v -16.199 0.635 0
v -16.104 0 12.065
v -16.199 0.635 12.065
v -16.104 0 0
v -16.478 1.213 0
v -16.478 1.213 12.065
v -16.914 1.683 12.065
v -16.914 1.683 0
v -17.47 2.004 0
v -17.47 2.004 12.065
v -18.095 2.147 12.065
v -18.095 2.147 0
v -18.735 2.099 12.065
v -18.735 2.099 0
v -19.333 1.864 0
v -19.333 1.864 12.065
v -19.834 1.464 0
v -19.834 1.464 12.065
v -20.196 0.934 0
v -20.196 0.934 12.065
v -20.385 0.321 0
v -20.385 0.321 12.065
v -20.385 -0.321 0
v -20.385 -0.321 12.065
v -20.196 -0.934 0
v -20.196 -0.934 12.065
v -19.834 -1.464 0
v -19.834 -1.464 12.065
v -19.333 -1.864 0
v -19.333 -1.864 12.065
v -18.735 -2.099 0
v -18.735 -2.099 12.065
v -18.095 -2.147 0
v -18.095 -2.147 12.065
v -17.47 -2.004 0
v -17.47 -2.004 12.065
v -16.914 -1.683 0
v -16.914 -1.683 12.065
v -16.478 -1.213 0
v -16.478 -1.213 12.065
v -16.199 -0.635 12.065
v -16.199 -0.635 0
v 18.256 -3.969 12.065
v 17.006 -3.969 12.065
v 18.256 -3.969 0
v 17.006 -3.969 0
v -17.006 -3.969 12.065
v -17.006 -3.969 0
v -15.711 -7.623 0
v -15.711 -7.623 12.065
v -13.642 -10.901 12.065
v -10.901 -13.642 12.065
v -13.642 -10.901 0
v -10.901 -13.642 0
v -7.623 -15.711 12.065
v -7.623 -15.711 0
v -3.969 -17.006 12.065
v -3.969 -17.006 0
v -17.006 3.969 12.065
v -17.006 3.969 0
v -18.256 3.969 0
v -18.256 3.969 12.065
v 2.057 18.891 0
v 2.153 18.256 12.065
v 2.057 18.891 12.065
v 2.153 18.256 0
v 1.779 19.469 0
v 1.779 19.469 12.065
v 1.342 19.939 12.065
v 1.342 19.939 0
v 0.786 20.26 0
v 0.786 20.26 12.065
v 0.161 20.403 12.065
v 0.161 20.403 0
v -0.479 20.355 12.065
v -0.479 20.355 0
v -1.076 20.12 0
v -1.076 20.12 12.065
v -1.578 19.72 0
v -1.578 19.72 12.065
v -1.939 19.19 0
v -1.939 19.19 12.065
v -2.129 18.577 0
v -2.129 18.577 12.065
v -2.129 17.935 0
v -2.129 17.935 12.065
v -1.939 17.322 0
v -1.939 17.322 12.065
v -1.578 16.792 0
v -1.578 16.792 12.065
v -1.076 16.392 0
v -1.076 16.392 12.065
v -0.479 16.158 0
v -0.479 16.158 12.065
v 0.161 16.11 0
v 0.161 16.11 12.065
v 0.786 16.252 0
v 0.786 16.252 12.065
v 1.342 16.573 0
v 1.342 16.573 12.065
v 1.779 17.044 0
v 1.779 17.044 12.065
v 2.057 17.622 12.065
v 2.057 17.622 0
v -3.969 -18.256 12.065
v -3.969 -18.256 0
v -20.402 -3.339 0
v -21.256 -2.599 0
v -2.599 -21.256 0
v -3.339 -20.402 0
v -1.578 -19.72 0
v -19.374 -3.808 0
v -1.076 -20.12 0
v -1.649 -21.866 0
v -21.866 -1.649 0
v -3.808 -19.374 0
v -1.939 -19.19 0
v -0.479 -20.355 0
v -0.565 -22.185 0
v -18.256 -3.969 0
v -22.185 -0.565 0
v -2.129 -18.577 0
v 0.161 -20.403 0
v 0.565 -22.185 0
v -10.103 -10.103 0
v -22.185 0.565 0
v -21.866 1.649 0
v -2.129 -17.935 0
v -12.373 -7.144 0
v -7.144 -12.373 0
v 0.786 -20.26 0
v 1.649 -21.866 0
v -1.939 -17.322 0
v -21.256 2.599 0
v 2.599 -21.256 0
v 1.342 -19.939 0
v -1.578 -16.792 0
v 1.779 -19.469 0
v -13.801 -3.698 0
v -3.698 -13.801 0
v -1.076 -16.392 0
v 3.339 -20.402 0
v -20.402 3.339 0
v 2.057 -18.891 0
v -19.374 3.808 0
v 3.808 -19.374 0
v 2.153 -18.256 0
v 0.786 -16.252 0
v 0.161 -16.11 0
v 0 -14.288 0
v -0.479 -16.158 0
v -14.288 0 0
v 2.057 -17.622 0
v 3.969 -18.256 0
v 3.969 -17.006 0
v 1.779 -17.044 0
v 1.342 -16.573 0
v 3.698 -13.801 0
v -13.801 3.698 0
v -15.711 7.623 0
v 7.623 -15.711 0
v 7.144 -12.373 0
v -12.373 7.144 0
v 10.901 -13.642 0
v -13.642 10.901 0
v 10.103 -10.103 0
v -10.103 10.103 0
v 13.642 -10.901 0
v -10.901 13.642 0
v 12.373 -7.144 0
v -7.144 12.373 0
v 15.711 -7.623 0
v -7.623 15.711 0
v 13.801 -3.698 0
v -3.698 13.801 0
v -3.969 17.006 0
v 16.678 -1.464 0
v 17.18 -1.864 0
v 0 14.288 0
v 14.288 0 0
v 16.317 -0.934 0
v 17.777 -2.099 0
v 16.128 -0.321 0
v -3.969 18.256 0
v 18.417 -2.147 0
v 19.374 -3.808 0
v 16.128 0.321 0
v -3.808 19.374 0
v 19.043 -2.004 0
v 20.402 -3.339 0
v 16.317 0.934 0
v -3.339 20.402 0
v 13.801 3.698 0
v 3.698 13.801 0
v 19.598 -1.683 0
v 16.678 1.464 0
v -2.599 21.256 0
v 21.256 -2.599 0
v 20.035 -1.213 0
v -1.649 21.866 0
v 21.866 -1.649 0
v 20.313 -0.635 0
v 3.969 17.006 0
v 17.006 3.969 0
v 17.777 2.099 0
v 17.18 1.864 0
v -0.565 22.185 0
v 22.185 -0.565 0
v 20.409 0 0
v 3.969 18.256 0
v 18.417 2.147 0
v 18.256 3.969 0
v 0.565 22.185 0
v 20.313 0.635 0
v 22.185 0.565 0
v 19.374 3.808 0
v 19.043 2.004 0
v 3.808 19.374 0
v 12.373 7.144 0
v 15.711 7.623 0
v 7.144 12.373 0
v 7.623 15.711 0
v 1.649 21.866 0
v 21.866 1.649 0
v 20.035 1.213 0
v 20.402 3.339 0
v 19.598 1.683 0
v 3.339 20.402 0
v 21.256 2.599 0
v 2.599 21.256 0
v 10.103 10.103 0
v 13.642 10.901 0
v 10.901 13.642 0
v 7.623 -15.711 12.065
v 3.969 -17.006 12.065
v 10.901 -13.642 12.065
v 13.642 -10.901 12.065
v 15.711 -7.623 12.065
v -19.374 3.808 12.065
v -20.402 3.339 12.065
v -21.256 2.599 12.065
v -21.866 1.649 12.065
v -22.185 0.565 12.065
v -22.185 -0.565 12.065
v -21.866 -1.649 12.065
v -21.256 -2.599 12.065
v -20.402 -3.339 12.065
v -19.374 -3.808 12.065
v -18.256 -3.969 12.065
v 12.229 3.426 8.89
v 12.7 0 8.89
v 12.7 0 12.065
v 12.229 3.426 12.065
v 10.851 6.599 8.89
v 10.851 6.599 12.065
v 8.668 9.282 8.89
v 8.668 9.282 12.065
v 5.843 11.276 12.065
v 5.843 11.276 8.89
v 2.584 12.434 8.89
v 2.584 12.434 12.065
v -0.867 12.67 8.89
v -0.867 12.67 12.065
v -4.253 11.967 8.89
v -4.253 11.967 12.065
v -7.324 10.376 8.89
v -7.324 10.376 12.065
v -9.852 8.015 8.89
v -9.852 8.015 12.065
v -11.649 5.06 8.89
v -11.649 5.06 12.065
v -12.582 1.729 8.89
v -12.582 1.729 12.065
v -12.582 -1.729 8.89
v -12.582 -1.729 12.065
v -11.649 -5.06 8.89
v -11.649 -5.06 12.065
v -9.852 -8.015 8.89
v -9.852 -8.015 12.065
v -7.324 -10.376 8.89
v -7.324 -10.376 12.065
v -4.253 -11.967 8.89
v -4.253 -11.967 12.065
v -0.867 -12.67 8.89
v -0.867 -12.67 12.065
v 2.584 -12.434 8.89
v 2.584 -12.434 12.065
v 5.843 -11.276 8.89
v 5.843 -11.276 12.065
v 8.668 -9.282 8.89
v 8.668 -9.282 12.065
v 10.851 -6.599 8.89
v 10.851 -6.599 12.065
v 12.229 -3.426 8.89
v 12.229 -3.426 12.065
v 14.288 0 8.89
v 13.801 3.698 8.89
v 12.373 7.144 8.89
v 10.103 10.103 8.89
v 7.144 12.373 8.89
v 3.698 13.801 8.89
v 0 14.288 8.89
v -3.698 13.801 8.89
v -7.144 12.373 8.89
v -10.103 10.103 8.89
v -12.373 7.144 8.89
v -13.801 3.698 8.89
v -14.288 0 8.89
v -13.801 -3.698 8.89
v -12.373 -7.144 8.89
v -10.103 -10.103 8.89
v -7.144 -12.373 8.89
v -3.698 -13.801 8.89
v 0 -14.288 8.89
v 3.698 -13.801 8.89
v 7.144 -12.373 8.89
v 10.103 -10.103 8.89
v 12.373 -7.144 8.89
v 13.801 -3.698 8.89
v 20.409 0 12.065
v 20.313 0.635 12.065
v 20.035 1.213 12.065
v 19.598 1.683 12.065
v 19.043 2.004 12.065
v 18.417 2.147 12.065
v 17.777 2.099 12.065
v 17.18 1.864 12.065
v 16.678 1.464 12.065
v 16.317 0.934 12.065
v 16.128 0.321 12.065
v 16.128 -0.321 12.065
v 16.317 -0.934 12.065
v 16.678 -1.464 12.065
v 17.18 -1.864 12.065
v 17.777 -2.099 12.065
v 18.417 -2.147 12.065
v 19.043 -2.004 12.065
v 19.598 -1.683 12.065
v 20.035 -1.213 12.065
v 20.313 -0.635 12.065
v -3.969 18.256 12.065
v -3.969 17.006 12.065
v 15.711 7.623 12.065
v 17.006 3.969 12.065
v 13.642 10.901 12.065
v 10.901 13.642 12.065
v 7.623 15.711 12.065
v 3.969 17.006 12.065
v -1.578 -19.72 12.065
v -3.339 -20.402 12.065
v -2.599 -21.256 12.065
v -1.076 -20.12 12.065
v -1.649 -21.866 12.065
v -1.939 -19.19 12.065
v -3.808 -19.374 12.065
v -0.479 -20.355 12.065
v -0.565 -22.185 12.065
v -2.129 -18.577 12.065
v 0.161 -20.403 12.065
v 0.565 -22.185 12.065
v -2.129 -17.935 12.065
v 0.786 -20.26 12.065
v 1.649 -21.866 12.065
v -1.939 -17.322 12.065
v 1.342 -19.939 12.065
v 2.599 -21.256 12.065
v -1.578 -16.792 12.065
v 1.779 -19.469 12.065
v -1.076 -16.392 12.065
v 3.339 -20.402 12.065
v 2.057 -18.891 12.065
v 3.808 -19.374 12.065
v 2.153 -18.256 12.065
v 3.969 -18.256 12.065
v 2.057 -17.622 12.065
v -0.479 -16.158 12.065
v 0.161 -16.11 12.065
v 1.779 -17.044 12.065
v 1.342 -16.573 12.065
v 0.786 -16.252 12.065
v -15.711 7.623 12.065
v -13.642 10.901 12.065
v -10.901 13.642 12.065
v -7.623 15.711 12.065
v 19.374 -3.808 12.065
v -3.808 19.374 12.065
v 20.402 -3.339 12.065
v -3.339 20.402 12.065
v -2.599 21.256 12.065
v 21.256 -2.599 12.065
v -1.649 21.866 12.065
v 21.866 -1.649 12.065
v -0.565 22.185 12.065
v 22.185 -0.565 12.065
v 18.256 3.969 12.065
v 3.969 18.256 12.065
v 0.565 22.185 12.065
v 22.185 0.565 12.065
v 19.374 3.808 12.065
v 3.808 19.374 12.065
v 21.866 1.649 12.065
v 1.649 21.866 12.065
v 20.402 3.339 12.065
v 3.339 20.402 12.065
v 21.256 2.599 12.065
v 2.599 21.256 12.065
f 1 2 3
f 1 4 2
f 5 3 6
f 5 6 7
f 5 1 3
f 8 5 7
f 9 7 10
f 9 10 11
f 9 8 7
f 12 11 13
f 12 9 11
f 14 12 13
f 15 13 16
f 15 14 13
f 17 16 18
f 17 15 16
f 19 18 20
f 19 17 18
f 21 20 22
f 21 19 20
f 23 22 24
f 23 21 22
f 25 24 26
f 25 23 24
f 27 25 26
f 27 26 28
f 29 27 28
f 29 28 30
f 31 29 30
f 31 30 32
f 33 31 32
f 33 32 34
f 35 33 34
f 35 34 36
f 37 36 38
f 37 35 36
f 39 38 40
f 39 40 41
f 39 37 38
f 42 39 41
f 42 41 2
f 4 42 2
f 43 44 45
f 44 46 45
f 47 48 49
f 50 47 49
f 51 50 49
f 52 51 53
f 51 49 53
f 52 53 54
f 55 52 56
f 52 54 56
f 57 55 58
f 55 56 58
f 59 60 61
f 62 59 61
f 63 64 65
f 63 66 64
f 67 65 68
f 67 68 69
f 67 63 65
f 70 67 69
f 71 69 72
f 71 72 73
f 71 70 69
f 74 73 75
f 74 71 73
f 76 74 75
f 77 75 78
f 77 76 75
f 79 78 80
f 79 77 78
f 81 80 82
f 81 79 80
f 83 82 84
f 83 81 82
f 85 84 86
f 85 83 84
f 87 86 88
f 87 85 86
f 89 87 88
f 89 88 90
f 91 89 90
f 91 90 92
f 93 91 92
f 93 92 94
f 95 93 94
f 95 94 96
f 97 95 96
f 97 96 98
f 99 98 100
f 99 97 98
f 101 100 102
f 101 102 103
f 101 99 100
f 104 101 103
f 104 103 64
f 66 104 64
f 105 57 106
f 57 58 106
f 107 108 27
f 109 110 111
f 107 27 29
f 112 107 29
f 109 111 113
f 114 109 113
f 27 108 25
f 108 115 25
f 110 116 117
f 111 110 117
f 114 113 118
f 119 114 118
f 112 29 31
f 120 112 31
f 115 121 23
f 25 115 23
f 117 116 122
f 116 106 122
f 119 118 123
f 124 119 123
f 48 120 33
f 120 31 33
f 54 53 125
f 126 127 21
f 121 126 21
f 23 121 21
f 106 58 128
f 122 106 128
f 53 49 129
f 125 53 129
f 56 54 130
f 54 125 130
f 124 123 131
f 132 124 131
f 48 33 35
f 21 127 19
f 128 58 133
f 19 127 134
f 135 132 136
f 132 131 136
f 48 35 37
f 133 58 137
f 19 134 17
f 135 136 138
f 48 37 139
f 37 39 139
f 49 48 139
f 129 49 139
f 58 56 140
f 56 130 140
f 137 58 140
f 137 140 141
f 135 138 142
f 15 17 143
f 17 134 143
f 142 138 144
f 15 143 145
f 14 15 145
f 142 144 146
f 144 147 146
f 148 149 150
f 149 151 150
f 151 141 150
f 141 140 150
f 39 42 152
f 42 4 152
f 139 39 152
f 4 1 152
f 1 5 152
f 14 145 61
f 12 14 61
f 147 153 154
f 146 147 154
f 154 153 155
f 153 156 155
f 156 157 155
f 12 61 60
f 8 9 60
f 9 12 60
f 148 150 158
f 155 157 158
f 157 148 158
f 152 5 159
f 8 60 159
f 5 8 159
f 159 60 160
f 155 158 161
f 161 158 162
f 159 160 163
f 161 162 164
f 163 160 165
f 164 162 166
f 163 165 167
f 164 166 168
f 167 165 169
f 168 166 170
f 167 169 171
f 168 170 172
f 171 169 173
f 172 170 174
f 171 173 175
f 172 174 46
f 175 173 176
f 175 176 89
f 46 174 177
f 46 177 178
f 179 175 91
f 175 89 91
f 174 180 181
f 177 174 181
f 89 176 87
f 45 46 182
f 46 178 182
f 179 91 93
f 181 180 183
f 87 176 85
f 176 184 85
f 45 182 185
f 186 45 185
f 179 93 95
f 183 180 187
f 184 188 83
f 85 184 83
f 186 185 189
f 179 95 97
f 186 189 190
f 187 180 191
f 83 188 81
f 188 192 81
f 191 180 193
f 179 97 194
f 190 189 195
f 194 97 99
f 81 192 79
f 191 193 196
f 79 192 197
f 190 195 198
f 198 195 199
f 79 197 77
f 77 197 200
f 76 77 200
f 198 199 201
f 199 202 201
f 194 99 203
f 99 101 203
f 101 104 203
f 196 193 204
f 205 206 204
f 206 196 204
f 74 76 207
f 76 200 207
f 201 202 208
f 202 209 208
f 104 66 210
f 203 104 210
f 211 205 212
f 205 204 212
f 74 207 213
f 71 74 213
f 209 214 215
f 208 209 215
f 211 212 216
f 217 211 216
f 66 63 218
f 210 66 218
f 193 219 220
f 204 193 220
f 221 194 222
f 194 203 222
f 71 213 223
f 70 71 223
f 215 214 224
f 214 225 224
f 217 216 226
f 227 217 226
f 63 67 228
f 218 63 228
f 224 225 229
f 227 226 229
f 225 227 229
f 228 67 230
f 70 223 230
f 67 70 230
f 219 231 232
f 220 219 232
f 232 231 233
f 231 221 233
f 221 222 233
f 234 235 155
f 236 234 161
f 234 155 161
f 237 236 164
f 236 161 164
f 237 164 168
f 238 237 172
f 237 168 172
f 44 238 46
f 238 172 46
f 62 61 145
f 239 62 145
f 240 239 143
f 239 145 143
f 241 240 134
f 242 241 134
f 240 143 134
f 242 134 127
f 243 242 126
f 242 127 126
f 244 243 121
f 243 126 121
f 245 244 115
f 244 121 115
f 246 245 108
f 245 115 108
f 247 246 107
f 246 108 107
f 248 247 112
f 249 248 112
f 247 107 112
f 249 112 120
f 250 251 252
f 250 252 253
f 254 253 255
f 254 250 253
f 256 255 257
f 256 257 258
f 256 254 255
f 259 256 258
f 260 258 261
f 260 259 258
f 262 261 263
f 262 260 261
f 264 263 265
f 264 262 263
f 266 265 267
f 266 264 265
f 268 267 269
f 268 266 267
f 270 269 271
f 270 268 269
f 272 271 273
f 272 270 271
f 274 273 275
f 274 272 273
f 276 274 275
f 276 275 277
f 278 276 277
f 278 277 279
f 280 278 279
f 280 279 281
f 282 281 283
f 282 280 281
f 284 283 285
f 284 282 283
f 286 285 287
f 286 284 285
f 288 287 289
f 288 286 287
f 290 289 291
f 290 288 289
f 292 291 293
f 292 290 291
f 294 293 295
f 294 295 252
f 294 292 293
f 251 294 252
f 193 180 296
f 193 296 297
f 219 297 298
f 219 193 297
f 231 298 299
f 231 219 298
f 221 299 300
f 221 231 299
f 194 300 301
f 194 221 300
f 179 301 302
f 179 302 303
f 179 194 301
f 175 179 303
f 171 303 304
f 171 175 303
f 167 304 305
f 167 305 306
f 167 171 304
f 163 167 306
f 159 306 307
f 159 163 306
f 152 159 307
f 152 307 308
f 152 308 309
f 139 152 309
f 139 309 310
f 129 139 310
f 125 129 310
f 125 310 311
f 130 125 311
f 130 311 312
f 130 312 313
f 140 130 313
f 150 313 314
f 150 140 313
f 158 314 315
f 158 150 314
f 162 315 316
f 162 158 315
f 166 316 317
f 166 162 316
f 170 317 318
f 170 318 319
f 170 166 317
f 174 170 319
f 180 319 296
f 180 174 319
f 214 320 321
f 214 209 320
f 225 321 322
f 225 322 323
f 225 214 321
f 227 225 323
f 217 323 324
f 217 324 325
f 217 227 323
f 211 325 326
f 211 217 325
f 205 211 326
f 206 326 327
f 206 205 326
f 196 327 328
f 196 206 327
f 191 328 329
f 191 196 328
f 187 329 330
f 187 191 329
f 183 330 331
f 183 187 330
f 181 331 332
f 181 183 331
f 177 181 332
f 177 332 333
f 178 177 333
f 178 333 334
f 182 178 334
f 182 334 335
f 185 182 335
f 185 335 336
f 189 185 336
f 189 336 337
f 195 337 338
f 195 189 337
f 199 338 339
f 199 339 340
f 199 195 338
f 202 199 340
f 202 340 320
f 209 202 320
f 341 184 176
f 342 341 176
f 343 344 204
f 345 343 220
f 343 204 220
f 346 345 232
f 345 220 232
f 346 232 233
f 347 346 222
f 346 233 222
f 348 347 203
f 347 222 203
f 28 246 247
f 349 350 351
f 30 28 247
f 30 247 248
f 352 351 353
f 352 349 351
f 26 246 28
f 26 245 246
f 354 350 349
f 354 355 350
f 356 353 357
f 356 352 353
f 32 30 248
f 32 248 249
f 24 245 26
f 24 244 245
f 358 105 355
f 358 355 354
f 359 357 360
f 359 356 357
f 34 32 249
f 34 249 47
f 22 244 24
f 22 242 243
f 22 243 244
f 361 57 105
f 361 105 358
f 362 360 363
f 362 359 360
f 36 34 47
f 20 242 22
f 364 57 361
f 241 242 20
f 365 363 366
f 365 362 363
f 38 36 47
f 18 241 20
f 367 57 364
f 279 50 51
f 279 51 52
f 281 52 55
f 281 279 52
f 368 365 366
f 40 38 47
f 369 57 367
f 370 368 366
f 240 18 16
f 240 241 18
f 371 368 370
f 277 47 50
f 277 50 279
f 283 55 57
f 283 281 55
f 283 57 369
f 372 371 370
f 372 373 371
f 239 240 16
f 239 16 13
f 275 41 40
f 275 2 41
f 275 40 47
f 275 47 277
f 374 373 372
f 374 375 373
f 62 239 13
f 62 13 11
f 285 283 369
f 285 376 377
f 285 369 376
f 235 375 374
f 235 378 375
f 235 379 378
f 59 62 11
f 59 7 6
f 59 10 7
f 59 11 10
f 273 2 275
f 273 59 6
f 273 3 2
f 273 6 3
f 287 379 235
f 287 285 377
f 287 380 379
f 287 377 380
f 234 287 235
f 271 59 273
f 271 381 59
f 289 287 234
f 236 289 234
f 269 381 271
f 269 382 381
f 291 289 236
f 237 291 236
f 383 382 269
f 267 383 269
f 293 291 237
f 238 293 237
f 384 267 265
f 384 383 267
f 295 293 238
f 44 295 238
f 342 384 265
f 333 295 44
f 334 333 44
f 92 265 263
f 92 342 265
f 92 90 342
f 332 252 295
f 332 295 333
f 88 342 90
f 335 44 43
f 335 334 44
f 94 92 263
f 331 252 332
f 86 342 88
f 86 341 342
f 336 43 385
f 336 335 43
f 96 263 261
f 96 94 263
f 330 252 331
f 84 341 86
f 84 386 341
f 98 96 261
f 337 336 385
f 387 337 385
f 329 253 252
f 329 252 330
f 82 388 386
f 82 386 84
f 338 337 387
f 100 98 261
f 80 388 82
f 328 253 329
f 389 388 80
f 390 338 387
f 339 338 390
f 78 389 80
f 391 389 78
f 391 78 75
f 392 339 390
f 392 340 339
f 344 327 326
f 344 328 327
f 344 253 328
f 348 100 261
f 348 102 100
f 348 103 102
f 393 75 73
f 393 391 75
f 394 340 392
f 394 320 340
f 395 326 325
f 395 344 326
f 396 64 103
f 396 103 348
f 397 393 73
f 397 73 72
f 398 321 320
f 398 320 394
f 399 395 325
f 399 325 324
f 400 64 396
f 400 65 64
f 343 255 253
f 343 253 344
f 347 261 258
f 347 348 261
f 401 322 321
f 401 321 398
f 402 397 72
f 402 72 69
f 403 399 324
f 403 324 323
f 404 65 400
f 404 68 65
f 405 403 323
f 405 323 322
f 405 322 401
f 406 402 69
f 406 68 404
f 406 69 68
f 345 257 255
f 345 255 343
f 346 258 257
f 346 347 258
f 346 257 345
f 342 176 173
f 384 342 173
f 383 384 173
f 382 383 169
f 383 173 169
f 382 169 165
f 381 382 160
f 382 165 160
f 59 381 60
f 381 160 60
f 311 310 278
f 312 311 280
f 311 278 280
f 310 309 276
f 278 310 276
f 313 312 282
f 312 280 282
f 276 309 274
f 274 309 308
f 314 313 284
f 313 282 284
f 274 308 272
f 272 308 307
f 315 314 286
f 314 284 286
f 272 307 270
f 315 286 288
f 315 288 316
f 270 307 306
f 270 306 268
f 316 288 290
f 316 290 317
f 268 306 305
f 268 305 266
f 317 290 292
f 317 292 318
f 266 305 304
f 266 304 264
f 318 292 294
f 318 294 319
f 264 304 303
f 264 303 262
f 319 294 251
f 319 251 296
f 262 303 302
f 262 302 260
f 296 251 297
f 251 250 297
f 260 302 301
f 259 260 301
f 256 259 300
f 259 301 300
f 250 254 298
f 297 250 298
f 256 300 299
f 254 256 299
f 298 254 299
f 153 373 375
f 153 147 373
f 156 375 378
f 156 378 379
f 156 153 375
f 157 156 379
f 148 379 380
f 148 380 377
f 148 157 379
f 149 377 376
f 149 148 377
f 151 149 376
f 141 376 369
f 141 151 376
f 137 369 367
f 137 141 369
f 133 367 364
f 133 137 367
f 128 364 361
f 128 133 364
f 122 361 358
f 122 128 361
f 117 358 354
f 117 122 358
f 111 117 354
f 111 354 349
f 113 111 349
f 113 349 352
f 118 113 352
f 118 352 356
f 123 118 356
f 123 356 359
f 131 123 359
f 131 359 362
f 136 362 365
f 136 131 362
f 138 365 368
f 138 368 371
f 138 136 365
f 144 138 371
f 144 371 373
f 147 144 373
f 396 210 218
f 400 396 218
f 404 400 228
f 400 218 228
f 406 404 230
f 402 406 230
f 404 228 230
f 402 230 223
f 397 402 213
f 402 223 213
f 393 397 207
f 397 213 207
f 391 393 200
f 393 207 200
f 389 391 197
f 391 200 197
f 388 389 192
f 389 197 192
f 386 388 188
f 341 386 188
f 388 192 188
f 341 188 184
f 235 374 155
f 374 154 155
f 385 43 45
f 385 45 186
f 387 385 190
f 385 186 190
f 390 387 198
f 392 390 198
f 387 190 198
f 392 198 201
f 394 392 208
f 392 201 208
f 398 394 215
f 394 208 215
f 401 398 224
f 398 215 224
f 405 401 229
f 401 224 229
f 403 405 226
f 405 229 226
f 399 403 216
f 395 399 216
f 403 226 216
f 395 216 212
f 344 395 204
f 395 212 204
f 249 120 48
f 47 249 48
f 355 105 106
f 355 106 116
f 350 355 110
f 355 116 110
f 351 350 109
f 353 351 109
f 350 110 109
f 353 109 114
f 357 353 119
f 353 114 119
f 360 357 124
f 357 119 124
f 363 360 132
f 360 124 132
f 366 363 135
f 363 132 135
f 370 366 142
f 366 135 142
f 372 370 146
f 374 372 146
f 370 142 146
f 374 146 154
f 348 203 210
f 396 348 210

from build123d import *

# Parameters (mm, degrees)
F0_R     = 2.15265
F0_R_2   = 14.2875
F1_DEPTH = 8.89
F2_R     = 2.15265
F2_R_2   = 14.2875
F2_R_3   = 12.7
F3_DEPTH = 3.175


with BuildPart() as f1:
    # F0 (on Top) → F1 (new body)
    with BuildSketch(Plane.XY):
        with BuildLine():
            Line((3.96875, 17.0055264455), (3.96875, 18.25625))
            ThreePointArc((3.96875, 18.25625), (0, 22.225), (-3.96875, 18.25625))
            Line((-3.96875, 18.25625), (-3.96875, 17.0055264455))
            ThreePointArc((-3.96875, 17.0055264455), (-12.3478521665, 12.3478521665), (-17.0055264455, 3.96875))
            Line((-17.0055264455, 3.96875), (-18.25625, 3.96875))
            ThreePointArc((-18.25625, 3.96875), (-22.225, 0), (-18.25625, -3.96875))
            Line((-18.25625, -3.96875), (-17.0055264455, -3.96875))
            ThreePointArc((-17.0055264455, -3.96875), (-12.3478521665, -12.3478521665), (-3.96875, -17.0055264455))
            Line((-3.96875, -17.0055264455), (-3.96875, -18.25625))
            ThreePointArc((-3.96875, -18.25625), (0, -22.225), (3.96875, -18.25625))
            Line((3.96875, -18.25625), (3.96875, -17.0055264455))
            ThreePointArc((3.96875, -17.0055264455), (12.3478521665, -12.3478521665), (17.0055264455, -3.96875))
            Line((17.0055264455, -3.96875), (18.25625, -3.96875))
            ThreePointArc((18.25625, -3.96875), (22.225, 0), (18.25625, 3.96875))
            Line((18.25625, 3.96875), (17.0055264455, 3.96875))
            ThreePointArc((17.0055264455, 3.96875), (12.3478521665, 12.3478521665), (3.96875, 17.0055264455))
        make_face()
        with Locations((0, -18.25625)):
            Circle(F0_R, mode=Mode.SUBTRACT)
        with Locations((-18.25625, 0)):
            Circle(F0_R, mode=Mode.SUBTRACT)
        Circle(F0_R_2, mode=Mode.SUBTRACT)
        with Locations((18.25625, 0)):
            Circle(F0_R, mode=Mode.SUBTRACT)
        with Locations((0, 18.25625)):
            Circle(F0_R, mode=Mode.SUBTRACT)
    extrude(amount=F1_DEPTH)

    # F2 (on face) → F3 (join)
    with BuildSketch(Plane.XY.offset(8.89)):
        with BuildLine():
            ThreePointArc((-17.0055264455, -3.96875), (-12.3478521665, -12.3478521665), (-3.96875, -17.0055264455))
            Line((-3.96875, -17.0055264455), (-3.96875, -18.25625))
            ThreePointArc((-3.96875, -18.25625), (0, -22.225), (3.96875, -18.25625))
            Line((3.96875, -18.25625), (3.96875, -17.0055264455))
            ThreePointArc((3.96875, -17.0055264455), (12.3478521665, -12.3478521665), (17.0055264455, -3.96875))
            Line((17.0055264455, -3.96875), (18.25625, -3.96875))
            ThreePointArc((18.25625, -3.96875), (22.225, 0), (18.25625, 3.96875))
            Line((18.25625, 3.96875), (17.0055264455, 3.96875))
            ThreePointArc((17.0055264455, 3.96875), (12.3478521665, 12.3478521665), (3.96875, 17.0055264455))
            Line((3.96875, 17.0055264455), (3.96875, 18.25625))
            ThreePointArc((3.96875, 18.25625), (0, 22.225), (-3.96875, 18.25625))
            Line((-3.96875, 18.25625), (-3.96875, 17.0055264455))
            ThreePointArc((-3.96875, 17.0055264455), (-12.3478521665, 12.3478521665), (-17.0055264455, 3.96875))
            Line((-17.0055264455, 3.96875), (-18.25625, 3.96875))
            ThreePointArc((-18.25625, 3.96875), (-22.225, 0), (-18.25625, -3.96875))
            Line((-18.25625, -3.96875), (-17.0055264455, -3.96875))
        make_face()
        with Locations((0, -18.25625)):
            Circle(F2_R, mode=Mode.SUBTRACT)
        with Locations((-18.25625, 0)):
            Circle(F2_R, mode=Mode.SUBTRACT)
        Circle(F2_R_2, mode=Mode.SUBTRACT)
        with Locations((18.25625, 0)):
            Circle(F2_R, mode=Mode.SUBTRACT)
        with Locations((0, 18.25625)):
            Circle(F2_R, mode=Mode.SUBTRACT)
        Circle(F2_R_2)
        Circle(F2_R_3, mode=Mode.SUBTRACT)
    extrude(amount=F3_DEPTH)


solid = f1.part
